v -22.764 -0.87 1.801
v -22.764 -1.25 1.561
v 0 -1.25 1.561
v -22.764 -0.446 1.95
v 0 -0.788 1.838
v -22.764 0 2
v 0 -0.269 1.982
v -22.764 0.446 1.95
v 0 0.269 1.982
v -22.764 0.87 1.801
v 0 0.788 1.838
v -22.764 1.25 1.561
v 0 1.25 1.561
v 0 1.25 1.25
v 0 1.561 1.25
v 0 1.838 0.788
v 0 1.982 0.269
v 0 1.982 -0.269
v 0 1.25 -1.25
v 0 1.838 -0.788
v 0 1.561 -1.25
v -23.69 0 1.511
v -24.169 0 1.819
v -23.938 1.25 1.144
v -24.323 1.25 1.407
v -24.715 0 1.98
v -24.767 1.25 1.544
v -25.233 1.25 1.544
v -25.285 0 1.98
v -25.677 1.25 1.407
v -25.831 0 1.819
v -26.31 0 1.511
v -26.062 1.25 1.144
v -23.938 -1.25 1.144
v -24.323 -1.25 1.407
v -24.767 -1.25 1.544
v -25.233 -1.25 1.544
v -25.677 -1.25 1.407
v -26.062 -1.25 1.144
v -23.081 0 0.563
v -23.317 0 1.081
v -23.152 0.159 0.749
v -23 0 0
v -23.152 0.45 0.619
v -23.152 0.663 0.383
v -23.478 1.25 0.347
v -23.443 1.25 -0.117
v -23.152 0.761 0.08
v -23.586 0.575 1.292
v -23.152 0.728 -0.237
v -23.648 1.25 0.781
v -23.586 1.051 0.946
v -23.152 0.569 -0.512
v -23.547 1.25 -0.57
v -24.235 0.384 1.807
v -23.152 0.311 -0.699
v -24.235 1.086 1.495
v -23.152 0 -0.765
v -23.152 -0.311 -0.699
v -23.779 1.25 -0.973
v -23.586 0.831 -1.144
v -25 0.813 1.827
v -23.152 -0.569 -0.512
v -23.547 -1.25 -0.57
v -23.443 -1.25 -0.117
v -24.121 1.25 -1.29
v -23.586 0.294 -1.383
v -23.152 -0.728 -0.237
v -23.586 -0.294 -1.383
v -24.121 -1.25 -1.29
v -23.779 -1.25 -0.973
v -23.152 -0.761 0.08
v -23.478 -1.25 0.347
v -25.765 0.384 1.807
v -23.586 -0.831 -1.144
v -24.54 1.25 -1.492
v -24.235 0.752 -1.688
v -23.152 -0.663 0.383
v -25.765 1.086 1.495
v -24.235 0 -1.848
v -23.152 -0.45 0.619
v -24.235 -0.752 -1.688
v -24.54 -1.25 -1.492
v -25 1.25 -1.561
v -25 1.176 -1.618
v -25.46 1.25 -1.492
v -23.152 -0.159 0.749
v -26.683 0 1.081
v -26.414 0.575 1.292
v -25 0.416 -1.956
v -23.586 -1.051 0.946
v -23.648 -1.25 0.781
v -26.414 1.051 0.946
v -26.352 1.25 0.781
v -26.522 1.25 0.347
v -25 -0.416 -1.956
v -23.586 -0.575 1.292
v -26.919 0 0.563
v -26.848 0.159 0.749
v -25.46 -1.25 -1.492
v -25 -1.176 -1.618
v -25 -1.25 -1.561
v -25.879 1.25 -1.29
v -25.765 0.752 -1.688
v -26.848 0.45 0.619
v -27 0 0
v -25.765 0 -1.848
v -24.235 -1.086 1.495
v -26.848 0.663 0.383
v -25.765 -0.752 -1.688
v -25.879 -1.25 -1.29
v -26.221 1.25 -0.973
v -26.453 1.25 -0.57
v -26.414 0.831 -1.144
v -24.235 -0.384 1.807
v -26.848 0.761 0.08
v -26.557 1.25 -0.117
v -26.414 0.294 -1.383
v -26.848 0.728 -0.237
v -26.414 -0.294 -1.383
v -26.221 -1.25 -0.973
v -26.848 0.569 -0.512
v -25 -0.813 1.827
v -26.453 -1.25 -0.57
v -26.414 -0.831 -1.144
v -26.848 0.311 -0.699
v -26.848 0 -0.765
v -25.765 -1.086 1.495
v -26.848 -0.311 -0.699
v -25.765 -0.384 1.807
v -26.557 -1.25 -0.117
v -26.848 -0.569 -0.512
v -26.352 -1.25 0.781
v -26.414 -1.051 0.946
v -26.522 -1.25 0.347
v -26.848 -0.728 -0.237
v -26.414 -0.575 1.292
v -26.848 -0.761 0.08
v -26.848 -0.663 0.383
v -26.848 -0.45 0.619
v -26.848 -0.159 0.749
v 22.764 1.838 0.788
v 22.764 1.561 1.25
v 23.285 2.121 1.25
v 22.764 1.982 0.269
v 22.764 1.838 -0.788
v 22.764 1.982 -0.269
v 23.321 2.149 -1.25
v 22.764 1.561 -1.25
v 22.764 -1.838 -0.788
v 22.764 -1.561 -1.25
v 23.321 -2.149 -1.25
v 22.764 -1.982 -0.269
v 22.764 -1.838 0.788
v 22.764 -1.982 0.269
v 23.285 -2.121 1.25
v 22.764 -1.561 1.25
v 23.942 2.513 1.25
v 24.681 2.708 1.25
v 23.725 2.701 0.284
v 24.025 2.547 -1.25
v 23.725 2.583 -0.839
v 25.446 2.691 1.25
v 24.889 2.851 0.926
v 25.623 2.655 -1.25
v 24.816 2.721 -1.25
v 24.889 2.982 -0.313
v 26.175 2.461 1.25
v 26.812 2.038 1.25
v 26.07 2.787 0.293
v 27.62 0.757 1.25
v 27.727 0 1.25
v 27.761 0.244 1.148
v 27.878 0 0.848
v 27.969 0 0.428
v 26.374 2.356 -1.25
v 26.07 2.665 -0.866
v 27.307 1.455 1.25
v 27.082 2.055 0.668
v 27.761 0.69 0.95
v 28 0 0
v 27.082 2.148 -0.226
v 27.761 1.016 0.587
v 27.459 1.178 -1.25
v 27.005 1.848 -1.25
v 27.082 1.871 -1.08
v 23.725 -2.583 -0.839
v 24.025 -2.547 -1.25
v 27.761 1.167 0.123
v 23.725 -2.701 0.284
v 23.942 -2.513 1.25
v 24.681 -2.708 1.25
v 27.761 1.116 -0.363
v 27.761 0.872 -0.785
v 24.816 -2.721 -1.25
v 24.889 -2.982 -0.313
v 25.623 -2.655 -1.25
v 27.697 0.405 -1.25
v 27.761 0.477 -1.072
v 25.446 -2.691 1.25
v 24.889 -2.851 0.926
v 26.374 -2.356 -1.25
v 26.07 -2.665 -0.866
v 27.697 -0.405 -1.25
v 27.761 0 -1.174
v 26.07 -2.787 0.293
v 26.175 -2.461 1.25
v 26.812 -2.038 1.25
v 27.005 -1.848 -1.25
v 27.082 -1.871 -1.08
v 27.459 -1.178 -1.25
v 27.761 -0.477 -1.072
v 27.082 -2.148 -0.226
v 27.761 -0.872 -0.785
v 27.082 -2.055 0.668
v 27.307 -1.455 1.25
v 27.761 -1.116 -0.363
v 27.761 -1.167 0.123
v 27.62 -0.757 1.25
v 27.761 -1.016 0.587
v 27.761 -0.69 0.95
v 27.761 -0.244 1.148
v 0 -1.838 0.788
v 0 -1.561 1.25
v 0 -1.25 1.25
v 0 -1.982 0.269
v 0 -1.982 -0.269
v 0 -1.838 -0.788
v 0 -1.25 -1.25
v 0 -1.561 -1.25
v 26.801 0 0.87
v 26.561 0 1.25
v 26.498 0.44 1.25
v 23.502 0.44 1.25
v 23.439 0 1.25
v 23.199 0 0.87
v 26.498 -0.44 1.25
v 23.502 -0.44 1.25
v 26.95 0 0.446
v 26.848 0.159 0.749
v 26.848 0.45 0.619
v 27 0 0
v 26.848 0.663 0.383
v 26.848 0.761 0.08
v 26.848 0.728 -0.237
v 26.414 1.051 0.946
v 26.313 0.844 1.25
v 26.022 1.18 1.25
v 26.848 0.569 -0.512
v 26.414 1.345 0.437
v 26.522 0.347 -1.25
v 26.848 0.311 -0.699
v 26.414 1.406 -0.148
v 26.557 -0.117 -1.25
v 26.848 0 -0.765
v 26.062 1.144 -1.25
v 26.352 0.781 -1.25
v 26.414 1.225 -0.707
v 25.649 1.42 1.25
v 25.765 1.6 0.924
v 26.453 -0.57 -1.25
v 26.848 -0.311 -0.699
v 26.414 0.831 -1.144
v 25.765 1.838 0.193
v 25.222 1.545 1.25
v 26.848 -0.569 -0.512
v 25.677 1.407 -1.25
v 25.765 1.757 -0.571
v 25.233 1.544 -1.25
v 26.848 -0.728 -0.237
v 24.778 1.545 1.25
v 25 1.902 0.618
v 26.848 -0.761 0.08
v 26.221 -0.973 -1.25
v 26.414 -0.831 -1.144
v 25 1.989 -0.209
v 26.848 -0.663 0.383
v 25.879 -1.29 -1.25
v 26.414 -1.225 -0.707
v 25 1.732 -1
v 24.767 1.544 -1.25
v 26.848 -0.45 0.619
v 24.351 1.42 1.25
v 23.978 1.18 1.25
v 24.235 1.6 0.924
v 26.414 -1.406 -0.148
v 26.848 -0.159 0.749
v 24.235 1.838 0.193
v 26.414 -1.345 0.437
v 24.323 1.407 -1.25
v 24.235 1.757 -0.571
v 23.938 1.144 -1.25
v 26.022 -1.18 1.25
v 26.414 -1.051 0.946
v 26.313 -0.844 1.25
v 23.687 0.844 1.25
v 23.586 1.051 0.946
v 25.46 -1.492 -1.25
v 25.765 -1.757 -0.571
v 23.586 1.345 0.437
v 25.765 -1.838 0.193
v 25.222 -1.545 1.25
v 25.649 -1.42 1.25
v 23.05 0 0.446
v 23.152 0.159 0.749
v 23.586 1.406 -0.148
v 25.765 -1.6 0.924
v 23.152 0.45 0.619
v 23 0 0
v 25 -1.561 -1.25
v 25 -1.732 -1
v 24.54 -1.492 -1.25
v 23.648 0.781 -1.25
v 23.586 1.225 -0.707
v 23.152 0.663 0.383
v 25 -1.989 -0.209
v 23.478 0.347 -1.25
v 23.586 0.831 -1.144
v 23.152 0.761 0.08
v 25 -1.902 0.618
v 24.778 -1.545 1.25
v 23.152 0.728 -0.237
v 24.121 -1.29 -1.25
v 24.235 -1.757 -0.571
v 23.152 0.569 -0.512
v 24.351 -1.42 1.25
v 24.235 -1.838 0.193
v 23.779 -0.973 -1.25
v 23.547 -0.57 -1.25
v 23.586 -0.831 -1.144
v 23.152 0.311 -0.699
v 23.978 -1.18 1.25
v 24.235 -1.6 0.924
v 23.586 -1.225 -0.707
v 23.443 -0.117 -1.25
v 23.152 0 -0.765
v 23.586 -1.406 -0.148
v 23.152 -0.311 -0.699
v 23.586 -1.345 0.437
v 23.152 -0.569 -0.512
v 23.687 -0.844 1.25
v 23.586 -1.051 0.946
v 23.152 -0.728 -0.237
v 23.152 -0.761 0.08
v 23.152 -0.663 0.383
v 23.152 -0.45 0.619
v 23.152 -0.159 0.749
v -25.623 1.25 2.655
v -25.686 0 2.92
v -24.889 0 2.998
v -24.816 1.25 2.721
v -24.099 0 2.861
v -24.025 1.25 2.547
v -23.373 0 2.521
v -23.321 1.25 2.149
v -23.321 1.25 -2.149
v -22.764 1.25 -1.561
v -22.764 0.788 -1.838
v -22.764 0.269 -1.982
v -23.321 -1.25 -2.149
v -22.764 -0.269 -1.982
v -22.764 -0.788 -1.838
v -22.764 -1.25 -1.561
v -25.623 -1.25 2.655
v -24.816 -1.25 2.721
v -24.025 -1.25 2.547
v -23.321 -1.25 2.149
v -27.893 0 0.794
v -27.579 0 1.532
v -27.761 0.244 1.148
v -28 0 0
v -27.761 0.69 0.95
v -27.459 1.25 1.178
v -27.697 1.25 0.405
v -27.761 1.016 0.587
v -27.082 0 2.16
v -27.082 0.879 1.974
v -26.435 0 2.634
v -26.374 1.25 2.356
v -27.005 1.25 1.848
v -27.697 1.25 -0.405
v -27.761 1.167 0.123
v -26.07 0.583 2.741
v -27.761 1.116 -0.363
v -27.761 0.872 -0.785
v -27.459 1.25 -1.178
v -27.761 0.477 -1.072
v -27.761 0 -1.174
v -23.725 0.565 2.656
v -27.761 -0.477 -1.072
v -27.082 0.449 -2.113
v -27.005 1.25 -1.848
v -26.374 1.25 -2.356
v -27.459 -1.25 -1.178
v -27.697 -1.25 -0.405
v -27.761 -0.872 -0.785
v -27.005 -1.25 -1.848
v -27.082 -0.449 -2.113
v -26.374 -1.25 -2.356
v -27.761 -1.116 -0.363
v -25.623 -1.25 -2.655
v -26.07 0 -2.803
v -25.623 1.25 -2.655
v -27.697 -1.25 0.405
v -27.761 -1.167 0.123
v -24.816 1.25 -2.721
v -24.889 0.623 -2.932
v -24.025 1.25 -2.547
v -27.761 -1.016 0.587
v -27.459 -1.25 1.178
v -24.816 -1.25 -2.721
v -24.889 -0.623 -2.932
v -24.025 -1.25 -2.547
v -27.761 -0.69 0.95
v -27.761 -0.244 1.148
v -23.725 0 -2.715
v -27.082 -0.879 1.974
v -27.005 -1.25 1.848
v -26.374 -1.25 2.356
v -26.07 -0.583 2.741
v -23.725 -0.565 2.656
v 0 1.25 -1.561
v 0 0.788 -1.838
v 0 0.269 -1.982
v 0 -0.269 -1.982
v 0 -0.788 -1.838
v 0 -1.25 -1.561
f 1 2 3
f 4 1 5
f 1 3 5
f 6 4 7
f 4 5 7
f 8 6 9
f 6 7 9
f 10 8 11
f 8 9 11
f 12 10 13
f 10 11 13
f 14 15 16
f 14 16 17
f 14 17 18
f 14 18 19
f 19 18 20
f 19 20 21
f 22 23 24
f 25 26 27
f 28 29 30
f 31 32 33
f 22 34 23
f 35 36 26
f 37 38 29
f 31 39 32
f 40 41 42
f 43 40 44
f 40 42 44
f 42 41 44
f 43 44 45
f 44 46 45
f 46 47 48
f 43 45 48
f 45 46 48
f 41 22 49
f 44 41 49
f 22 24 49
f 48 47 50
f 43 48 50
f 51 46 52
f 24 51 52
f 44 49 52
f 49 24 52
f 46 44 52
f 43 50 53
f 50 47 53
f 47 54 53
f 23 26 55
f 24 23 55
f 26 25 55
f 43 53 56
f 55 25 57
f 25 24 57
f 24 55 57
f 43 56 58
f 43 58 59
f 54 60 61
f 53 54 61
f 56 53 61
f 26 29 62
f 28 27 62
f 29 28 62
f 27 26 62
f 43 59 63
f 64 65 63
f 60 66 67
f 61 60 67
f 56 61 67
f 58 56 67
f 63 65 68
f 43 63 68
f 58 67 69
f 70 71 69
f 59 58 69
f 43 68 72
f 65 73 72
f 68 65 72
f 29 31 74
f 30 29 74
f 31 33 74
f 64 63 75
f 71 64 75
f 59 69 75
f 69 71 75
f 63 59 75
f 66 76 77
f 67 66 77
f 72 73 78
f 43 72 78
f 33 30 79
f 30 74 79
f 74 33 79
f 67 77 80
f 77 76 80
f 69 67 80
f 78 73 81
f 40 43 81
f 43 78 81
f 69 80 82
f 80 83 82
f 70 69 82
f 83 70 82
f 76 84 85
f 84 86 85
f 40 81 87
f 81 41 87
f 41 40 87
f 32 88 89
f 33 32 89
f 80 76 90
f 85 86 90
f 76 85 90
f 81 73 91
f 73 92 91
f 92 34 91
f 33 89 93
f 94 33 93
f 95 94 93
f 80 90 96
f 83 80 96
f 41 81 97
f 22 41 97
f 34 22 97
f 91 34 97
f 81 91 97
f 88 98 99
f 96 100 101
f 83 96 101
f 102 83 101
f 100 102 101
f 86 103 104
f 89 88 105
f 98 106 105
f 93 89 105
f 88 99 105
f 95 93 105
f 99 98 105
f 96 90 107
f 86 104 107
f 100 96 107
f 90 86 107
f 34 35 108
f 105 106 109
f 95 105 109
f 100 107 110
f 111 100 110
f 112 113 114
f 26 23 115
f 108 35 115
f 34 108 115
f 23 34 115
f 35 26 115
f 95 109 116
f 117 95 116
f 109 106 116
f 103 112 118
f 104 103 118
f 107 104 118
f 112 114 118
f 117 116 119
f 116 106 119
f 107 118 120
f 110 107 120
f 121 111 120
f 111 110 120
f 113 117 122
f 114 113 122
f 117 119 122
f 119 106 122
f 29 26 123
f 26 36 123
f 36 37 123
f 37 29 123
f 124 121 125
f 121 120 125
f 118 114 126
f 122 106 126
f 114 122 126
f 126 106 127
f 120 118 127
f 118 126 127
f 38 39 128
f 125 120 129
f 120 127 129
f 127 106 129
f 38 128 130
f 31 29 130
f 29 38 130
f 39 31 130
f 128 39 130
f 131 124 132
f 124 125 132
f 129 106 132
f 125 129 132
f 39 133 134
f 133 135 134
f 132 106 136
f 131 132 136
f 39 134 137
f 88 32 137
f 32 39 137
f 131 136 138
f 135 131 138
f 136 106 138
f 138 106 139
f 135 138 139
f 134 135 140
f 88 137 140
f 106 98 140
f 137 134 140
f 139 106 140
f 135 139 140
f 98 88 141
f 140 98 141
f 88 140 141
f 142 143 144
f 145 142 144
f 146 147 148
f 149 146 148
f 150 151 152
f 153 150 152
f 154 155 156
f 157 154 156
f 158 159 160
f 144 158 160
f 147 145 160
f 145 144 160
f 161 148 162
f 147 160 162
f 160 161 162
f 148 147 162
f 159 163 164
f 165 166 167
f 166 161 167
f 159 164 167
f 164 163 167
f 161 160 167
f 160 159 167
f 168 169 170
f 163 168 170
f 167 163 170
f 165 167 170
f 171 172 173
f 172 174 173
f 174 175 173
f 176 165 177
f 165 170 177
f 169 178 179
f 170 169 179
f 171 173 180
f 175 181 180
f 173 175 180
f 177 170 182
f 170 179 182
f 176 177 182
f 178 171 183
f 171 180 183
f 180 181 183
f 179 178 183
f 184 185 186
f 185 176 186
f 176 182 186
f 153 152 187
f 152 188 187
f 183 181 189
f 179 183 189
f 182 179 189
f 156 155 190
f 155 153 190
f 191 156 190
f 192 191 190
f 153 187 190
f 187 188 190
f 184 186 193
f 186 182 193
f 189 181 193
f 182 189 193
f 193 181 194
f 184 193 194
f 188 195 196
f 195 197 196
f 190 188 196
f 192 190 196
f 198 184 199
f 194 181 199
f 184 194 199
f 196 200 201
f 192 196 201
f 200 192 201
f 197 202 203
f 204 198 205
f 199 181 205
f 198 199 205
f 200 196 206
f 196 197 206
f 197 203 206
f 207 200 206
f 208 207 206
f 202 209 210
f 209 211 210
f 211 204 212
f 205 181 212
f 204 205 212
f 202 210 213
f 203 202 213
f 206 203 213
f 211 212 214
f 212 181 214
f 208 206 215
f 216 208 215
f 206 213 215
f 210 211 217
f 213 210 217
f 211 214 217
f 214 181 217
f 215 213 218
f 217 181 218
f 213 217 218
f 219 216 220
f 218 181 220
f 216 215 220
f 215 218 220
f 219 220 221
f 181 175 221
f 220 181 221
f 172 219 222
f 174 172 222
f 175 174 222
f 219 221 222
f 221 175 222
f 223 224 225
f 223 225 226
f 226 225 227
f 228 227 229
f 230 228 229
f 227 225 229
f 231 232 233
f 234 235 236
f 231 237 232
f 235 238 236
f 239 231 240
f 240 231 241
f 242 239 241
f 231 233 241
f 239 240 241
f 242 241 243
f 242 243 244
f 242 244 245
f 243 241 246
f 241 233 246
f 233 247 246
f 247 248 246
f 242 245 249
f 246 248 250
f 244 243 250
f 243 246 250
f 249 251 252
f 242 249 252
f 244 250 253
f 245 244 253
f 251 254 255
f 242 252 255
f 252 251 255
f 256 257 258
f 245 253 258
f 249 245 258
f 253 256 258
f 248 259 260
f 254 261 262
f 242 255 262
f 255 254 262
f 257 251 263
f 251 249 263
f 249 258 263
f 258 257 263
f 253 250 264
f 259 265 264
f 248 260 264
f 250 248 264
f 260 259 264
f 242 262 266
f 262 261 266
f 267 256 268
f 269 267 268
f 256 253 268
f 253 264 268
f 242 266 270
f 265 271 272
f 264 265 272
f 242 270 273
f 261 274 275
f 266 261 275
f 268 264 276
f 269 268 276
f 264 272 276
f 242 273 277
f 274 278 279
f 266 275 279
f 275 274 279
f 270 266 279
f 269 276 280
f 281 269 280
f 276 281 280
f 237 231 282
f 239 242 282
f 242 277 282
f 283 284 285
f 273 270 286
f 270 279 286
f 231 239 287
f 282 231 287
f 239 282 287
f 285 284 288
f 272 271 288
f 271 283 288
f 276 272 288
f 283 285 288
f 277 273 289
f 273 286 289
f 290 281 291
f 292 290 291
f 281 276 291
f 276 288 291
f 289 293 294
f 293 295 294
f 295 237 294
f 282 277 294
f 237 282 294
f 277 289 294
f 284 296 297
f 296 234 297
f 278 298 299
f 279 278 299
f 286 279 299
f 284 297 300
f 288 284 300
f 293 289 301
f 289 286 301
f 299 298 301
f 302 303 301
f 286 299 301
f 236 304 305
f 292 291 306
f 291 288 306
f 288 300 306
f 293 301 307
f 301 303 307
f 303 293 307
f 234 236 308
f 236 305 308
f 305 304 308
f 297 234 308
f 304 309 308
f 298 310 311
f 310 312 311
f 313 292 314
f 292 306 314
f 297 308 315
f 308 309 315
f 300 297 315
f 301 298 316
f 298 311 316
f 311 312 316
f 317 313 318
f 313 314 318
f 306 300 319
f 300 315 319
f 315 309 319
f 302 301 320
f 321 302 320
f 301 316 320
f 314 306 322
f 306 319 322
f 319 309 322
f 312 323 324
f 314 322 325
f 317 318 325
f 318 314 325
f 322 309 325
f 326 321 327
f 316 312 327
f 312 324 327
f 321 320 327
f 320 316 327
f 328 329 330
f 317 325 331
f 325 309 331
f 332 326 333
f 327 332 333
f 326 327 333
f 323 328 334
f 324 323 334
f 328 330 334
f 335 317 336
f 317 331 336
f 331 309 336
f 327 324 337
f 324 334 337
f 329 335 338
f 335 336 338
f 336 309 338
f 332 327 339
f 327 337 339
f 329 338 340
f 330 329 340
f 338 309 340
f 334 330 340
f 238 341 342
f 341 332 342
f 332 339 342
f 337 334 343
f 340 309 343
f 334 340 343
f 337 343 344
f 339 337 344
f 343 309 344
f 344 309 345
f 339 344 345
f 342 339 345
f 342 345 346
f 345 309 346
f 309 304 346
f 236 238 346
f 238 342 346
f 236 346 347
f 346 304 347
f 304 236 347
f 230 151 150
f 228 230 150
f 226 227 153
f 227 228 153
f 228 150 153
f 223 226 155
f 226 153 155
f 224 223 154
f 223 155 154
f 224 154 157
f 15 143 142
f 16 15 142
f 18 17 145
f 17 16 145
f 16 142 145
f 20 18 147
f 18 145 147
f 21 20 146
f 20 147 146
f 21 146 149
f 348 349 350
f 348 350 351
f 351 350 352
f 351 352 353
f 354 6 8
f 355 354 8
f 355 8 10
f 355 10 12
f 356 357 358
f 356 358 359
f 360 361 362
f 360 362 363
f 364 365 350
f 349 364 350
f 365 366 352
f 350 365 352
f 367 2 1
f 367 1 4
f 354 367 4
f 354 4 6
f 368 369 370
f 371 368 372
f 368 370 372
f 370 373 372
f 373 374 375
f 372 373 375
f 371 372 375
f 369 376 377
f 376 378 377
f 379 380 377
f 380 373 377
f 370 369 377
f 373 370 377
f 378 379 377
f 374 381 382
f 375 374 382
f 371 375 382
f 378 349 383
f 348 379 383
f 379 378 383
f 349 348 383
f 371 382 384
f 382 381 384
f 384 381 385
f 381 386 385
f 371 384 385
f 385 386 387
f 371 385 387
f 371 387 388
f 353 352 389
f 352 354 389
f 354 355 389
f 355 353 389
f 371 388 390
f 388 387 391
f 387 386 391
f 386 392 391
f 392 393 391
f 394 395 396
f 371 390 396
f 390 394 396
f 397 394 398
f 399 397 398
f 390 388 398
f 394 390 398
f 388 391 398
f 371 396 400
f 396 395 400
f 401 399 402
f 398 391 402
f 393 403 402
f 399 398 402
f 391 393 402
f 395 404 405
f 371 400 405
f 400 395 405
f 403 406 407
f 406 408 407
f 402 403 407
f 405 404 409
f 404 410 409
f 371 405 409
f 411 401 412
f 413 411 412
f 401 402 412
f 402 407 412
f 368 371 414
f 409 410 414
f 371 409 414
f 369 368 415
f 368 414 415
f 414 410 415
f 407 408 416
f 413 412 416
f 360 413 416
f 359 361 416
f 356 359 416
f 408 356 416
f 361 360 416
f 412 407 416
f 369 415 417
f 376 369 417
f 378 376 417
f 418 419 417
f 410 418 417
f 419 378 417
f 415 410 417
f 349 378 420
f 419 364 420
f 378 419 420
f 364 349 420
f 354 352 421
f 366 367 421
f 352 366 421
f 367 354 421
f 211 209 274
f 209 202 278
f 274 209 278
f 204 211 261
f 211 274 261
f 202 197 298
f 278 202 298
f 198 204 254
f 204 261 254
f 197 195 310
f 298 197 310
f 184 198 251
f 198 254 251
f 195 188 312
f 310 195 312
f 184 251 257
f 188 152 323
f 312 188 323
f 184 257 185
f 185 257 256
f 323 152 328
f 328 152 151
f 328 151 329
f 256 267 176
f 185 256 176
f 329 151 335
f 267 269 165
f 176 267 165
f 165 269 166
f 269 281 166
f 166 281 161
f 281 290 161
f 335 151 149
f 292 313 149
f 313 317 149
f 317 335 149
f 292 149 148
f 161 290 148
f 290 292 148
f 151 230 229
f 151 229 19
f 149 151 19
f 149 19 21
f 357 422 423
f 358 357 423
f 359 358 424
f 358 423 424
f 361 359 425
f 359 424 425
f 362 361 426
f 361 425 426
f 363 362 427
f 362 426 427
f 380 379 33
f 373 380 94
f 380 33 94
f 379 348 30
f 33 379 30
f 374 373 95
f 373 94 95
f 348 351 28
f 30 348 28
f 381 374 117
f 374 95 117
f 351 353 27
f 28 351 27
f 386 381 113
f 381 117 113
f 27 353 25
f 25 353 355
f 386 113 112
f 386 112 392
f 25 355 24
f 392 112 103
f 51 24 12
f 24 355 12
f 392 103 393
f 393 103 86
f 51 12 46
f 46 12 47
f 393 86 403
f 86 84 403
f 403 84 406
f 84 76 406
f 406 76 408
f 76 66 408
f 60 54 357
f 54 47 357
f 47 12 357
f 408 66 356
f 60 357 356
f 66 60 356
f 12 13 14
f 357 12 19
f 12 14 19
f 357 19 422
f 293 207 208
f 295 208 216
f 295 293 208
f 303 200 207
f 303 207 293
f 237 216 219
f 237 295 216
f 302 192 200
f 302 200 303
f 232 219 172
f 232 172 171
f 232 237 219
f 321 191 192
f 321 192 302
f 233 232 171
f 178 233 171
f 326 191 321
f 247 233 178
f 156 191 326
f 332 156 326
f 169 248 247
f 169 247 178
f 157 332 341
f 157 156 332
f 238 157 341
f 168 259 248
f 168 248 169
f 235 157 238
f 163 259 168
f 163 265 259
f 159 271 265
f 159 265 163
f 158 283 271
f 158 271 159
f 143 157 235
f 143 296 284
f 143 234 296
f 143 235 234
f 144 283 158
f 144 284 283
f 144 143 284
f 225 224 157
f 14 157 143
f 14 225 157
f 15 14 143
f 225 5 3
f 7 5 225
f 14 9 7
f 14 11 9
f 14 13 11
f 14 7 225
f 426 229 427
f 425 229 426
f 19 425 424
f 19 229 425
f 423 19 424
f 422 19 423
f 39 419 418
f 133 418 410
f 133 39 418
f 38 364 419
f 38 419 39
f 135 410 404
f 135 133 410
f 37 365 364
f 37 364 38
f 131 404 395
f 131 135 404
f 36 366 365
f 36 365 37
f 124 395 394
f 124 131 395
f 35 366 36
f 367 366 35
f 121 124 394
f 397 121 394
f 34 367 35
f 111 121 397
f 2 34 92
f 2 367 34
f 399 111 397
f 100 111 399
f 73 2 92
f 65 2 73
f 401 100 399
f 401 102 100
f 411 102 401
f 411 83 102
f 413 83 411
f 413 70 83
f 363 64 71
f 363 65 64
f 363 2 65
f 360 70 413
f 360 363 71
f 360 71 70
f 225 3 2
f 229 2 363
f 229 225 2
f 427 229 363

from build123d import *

# Parameters (mm, degrees)
SKETCH3_OUTSIDE_W   = 19.328
SKETCH3_OUTSIDE_H   = 19.328
SKETCH3_OUTSIDE_W_2 = 6
SKETCH3_OUTSIDE_H_2 = 2.5
CUT_EXTRUDE2_DEPTH  = 60
SKETCH5_OUTSIDE_W   = 19.328
SKETCH5_OUTSIDE_H   = 19.328
SKETCH5_OUTSIDE_W_2 = 2.5
SKETCH5_OUTSIDE_H_2 = 6
CUT_EXTRUDE3_DEPTH  = 29


with BuildPart() as part:
    # Sketch2 → Revolve1 (revolve)
    with BuildSketch(Plane(origin=(0, 0, 0), x_dir=(1, 0, 0), z_dir=(0, 1, 0))):
        with BuildLine():
            Line((-27, 0), (-28, 0))
            ThreePointArc((-28, 0), (-26.070466269, -2.802517077), (-22.763932023, -2))
            Line((-22.763932023, -2), (0, -2))
            Line((0, -2), (0, 0))
            Line((0, 0), (-23, 0))
            ThreePointArc((-23, 0), (-25, -2), (-27, 0))
        make_face()
        with BuildLine():
            Line((0, 0), (0, -2))
            Line((0, -2), (22.763932023, -2))
            ThreePointArc((22.763932023, -2), (26.070466269, -2.802517077), (28, 0))
            Line((28, 0), (27, 0))
            ThreePointArc((27, 0), (25, -2), (23, 0))
            Line((23, 0), (0, 0))
        make_face()
    revolve(axis=Axis((0, 0, 0), (-1, 0, 0)))

    # Sketch3 outside → Cut-Extrude2 (cut)
    with BuildSketch(Plane(origin=(0, 0, 0), x_dir=(0, 0, -1), z_dir=(1, 0, 0))):
        Rectangle(SKETCH3_OUTSIDE_W, SKETCH3_OUTSIDE_H)
        Rectangle(SKETCH3_OUTSIDE_W_2, SKETCH3_OUTSIDE_H_2, mode=Mode.SUBTRACT)
    extrude(amount=-CUT_EXTRUDE2_DEPTH, mode=Mode.SUBTRACT)

    # Sketch5 outside → Cut-Extrude3 (cut, through all)
    with BuildSketch(Plane(origin=(0, 0, 0), x_dir=(0, 0, -1), z_dir=(1, 0, 0))):
        Rectangle(SKETCH5_OUTSIDE_W, SKETCH5_OUTSIDE_H)
        Rectangle(SKETCH5_OUTSIDE_W_2, SKETCH5_OUTSIDE_H_2, mode=Mode.SUBTRACT)
    extrude(amount=CUT_EXTRUDE3_DEPTH, mode=Mode.SUBTRACT)


solid = part.part
